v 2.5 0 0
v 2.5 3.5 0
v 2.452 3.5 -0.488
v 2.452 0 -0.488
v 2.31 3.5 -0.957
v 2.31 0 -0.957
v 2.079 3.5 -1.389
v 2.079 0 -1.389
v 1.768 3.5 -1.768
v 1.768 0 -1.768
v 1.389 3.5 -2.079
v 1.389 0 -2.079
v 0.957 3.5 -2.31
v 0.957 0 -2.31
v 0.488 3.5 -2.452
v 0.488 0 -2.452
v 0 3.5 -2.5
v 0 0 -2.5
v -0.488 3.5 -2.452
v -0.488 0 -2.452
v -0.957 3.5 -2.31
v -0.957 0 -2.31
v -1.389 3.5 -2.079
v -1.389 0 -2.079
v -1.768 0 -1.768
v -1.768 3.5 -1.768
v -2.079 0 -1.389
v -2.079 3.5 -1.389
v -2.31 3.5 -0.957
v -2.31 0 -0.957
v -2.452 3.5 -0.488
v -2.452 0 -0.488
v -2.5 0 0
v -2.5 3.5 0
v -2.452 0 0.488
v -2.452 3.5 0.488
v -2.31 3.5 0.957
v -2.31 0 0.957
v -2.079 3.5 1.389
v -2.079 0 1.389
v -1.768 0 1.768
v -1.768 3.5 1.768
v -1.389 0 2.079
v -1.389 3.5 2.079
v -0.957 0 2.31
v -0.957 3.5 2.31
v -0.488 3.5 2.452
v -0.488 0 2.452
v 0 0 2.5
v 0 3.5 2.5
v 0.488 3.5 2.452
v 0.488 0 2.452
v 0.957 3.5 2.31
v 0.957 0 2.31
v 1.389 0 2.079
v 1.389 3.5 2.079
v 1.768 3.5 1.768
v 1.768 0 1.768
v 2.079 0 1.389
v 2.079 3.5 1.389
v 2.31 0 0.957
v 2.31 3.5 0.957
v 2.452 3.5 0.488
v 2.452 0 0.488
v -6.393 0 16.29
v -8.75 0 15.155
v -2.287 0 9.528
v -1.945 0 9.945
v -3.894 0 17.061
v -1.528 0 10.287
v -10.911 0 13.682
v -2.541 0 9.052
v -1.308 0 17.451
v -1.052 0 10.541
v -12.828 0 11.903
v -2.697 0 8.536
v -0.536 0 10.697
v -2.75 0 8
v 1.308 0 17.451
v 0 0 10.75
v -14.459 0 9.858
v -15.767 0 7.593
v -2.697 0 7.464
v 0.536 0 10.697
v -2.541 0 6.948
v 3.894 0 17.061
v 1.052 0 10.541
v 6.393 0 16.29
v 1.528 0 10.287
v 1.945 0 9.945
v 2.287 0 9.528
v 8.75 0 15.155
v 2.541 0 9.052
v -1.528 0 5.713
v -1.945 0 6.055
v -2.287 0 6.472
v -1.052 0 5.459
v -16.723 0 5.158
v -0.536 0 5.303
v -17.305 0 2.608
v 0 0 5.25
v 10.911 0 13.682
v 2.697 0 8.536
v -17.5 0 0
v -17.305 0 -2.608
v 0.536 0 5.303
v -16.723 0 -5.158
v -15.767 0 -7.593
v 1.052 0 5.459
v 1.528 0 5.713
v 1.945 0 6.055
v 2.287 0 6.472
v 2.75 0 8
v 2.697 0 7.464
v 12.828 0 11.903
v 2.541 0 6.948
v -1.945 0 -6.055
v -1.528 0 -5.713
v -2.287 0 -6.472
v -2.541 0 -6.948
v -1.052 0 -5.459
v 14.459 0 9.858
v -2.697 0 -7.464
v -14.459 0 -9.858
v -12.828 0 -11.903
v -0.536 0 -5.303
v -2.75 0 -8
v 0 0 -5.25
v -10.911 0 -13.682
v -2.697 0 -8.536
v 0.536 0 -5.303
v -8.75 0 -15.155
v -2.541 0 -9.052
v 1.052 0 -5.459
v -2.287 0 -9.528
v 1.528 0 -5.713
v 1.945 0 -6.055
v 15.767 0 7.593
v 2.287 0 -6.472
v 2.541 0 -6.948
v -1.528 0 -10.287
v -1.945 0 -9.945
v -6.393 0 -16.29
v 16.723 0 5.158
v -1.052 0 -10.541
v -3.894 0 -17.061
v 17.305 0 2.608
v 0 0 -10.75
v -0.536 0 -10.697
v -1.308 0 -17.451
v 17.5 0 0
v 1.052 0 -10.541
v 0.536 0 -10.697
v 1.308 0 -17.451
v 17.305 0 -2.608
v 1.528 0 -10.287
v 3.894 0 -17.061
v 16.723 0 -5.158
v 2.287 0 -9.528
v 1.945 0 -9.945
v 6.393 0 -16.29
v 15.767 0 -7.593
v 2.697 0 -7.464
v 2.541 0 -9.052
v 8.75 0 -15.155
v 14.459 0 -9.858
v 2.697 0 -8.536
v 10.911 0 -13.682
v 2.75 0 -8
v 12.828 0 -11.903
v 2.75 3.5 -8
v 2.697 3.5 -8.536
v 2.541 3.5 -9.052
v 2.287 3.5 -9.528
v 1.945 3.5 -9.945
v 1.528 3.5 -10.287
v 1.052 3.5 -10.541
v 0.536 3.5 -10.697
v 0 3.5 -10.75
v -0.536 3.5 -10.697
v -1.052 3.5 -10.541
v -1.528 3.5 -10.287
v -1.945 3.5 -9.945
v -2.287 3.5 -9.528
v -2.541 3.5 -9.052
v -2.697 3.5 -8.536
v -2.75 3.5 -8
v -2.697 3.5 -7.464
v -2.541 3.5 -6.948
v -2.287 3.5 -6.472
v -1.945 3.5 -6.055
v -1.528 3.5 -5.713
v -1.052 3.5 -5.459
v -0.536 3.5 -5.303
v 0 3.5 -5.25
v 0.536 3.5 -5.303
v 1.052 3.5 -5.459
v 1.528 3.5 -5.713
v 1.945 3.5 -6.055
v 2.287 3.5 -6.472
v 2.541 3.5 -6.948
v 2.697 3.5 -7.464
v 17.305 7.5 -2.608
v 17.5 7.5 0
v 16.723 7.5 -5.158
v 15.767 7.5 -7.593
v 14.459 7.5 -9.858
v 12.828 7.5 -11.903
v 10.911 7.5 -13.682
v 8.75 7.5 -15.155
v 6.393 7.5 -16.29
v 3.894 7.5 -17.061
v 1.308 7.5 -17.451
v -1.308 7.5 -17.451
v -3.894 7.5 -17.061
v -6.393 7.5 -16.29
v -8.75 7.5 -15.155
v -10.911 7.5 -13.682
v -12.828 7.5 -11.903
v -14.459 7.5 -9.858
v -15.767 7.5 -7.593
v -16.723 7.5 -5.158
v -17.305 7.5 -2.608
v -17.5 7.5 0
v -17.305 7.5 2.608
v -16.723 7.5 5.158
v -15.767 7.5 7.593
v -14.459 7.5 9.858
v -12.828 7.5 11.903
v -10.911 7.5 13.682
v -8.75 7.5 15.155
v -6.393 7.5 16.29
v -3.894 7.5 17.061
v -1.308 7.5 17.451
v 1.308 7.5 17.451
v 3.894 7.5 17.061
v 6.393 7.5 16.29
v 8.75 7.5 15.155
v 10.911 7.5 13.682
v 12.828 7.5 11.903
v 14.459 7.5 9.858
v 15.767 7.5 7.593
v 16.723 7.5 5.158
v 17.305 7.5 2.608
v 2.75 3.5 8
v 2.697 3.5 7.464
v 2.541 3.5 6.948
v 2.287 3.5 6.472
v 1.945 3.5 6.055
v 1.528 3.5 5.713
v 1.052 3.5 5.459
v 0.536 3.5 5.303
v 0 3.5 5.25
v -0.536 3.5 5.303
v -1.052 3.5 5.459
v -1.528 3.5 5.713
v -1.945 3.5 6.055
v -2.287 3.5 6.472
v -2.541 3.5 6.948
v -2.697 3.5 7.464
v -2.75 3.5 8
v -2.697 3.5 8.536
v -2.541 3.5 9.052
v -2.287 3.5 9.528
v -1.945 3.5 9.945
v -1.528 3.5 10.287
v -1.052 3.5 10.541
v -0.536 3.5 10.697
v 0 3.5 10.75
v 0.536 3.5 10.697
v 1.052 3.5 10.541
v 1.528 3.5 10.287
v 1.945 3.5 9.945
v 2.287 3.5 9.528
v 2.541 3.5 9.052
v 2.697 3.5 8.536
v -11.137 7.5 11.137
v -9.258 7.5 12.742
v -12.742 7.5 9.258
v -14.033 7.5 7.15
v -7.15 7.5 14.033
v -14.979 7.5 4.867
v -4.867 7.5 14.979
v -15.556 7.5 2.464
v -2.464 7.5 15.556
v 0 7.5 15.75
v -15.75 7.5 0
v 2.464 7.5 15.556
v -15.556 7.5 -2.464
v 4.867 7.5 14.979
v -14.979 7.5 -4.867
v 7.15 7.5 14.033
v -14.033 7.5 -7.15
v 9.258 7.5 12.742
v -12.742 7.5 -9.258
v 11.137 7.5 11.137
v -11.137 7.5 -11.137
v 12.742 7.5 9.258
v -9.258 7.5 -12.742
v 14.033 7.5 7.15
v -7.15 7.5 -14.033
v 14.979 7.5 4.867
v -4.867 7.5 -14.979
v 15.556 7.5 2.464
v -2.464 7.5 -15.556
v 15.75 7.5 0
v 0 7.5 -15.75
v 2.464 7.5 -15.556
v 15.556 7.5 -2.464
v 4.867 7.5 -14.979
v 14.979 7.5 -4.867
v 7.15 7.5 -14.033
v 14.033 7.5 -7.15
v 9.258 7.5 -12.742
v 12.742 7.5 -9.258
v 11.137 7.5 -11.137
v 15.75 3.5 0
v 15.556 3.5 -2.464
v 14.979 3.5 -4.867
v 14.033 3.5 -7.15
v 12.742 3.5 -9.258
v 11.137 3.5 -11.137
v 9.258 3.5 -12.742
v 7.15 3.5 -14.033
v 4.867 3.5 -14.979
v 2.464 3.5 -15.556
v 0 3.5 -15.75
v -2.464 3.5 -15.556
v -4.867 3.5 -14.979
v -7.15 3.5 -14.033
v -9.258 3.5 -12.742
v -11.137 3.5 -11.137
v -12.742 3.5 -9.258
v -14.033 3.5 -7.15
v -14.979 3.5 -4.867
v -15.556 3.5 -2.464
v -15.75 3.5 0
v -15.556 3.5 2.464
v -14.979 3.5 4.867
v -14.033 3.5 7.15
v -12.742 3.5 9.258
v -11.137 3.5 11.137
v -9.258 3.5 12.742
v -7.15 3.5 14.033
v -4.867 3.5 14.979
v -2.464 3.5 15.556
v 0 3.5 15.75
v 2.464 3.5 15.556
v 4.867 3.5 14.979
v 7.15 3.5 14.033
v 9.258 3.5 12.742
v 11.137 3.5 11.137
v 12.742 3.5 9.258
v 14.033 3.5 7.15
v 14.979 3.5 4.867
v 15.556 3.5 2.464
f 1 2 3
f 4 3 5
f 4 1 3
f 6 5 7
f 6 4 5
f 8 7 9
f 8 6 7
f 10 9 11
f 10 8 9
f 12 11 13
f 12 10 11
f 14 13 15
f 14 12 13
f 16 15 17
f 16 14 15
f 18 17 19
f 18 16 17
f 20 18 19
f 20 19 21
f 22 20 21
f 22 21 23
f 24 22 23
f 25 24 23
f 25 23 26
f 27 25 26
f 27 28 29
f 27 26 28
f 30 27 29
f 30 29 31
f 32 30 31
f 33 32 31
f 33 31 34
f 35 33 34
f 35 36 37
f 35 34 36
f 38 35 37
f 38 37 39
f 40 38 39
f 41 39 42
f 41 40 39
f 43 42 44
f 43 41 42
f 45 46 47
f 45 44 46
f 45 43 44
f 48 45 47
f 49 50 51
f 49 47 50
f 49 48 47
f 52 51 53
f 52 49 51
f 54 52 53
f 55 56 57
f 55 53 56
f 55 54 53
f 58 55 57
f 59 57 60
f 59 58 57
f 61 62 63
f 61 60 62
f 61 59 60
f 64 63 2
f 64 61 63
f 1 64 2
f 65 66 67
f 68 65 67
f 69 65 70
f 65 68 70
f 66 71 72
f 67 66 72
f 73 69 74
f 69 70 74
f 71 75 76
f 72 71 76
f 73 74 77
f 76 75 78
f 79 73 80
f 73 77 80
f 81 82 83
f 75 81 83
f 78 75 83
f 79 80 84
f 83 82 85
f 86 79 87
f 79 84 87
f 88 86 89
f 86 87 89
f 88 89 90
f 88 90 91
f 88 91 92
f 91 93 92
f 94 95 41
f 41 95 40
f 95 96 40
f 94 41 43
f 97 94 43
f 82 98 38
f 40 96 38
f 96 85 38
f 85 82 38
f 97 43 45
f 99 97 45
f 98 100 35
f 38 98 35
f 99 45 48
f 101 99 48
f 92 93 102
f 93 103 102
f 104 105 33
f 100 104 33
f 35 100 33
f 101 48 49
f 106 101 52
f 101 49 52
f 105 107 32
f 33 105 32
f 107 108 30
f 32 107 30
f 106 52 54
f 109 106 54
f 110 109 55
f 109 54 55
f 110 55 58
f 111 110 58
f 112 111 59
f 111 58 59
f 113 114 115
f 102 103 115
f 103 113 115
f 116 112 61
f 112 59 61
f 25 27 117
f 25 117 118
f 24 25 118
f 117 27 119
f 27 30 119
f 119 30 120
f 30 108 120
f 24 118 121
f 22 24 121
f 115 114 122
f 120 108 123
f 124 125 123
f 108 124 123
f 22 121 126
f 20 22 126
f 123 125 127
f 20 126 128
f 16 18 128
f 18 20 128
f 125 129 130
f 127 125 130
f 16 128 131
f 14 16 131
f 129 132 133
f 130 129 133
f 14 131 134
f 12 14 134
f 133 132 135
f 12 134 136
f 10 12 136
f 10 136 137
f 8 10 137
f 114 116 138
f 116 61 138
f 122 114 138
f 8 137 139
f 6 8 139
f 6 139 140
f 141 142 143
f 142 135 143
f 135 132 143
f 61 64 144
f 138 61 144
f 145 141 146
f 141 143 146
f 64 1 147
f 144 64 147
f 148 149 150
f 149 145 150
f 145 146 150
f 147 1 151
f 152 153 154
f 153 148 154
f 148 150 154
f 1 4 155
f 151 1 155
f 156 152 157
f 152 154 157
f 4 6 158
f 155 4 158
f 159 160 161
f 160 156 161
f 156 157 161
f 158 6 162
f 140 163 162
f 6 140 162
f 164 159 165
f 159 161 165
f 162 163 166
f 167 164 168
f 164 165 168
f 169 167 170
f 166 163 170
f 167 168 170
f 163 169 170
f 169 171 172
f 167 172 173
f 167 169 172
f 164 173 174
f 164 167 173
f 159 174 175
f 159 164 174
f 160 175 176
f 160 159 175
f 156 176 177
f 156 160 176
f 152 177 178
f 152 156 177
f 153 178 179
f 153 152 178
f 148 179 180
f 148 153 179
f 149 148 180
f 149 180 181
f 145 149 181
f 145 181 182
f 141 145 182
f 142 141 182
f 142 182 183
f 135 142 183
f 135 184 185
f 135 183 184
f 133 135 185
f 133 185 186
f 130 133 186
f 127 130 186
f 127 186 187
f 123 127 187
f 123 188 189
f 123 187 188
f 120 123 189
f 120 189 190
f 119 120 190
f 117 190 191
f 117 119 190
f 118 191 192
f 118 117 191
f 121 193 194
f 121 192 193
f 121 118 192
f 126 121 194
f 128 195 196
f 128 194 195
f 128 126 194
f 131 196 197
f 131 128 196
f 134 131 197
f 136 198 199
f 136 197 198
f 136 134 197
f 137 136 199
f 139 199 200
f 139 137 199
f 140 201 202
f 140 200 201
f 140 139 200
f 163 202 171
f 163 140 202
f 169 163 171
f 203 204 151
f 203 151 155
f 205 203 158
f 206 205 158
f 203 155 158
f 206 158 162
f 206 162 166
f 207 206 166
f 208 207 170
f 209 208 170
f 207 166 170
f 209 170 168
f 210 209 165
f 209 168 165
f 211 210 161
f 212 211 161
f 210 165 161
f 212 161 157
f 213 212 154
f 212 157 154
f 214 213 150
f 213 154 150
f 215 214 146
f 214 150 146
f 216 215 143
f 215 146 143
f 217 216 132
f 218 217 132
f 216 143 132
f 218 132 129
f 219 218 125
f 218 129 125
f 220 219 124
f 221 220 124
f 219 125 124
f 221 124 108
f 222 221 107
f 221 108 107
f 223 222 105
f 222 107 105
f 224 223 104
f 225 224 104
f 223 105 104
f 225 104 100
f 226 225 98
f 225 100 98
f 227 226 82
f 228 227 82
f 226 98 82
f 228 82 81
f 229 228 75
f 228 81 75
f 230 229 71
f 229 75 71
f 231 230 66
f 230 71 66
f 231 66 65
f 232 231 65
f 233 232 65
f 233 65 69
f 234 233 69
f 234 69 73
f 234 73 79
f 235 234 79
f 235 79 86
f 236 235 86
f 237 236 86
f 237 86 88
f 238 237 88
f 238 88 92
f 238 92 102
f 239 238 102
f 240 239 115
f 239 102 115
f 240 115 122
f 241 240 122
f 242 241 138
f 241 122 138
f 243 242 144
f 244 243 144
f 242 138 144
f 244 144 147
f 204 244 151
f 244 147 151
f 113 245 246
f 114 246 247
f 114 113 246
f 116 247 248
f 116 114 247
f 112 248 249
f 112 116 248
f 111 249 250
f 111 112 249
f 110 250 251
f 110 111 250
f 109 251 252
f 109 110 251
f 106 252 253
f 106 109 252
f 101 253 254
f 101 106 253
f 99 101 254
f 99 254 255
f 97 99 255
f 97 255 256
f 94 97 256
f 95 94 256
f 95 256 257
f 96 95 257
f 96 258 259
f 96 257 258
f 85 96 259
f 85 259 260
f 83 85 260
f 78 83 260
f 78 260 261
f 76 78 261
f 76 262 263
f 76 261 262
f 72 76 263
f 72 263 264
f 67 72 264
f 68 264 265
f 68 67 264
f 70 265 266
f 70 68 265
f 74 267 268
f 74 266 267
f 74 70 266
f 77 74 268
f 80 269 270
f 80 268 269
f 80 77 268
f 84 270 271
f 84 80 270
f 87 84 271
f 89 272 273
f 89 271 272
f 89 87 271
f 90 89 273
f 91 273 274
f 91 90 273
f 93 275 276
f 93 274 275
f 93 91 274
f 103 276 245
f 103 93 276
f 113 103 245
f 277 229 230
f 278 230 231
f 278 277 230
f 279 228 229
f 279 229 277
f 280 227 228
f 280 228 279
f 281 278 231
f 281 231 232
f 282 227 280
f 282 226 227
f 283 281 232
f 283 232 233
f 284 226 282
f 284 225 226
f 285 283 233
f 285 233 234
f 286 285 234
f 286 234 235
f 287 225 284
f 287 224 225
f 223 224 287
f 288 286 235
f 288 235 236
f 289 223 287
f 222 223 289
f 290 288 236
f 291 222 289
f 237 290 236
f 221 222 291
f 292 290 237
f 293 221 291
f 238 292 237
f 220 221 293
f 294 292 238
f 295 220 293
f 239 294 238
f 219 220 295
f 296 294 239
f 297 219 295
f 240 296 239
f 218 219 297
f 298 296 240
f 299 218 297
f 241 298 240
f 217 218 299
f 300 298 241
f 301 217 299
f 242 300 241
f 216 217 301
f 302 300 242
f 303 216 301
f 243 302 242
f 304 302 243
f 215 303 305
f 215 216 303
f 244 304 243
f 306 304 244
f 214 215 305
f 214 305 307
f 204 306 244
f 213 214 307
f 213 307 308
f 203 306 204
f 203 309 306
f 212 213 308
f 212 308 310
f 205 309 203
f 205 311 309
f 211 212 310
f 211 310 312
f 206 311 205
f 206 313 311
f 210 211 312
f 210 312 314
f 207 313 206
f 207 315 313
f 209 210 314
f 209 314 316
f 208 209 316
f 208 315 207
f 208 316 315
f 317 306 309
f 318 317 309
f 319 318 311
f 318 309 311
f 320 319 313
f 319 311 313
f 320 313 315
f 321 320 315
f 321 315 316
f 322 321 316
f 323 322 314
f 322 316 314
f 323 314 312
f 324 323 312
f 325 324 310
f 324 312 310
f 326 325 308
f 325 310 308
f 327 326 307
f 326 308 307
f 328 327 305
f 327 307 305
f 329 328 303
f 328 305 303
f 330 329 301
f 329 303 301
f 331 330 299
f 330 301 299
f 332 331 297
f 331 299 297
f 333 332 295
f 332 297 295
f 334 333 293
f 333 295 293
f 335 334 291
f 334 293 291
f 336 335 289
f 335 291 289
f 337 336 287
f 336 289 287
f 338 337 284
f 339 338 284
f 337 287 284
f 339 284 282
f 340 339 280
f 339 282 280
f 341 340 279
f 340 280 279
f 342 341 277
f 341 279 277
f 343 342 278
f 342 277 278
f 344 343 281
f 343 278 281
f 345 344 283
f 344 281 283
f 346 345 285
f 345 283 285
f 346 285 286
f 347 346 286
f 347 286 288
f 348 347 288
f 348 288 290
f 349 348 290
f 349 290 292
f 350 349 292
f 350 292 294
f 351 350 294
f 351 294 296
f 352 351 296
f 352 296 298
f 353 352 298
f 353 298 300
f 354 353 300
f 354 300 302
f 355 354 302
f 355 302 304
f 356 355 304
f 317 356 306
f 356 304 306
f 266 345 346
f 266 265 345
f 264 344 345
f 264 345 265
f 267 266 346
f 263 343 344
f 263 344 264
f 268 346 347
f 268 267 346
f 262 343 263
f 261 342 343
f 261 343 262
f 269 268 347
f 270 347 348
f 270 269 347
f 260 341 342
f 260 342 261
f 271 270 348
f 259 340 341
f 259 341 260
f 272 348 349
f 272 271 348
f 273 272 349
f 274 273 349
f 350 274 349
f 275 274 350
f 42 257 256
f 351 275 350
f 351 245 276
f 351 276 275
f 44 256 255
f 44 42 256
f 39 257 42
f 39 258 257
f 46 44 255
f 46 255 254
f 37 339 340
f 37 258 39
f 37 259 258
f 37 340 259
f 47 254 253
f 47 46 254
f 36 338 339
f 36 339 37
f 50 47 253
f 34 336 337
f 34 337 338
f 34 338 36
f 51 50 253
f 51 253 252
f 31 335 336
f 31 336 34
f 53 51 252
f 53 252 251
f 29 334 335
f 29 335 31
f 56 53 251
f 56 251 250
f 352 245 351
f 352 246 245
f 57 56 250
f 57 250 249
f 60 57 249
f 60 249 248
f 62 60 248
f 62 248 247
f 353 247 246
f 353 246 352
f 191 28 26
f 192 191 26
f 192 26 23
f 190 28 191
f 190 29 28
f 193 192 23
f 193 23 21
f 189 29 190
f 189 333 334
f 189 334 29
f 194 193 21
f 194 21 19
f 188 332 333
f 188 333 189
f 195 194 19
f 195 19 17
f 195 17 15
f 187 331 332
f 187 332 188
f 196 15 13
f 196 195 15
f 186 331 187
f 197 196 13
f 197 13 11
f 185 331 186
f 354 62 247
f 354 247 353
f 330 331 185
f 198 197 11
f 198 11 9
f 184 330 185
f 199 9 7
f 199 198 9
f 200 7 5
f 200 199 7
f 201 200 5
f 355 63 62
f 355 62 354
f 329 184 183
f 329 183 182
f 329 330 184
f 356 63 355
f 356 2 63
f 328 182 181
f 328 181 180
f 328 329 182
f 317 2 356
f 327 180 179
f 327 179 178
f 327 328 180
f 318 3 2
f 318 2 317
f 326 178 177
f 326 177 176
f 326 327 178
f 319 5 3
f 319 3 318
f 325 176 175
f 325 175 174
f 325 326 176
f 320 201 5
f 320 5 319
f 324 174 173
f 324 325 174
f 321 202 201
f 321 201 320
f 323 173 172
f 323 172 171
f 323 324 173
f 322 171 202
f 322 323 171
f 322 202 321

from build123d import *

# Parameters (mm, degrees)
SKETCH4_R        = 17.5
SKETCH4_R_2      = 2.75
SKETCH4_R_3      = 2.5
LIDBASE_DEPTH    = 7.5
SKETCH5_R        = 15.75
LIDGROOVES_DEPTH = 4


with BuildPart() as part:
    # Sketch4 → LidBase (new body)
    with BuildSketch(Plane(origin=(0, 0, 0), x_dir=(1, 0, 0), z_dir=(0, 1, 0))):
        Circle(SKETCH4_R)
        with Locations((0, -8)):
            Circle(SKETCH4_R_2, mode=Mode.SUBTRACT)
        with Locations((0, 8)):
            Circle(SKETCH4_R_2, mode=Mode.SUBTRACT)
        Circle(SKETCH4_R_3, mode=Mode.SUBTRACT)
    extrude(amount=LIDBASE_DEPTH)

    # Sketch5 → LidGrooves (cut)
    with BuildSketch(Plane(origin=(0, 7.5, 0), x_dir=(1, 0, 0), z_dir=(0, 1, 0))):
        Circle(SKETCH5_R)
    extrude(amount=-LIDGROOVES_DEPTH, mode=Mode.SUBTRACT)


solid = part.part
